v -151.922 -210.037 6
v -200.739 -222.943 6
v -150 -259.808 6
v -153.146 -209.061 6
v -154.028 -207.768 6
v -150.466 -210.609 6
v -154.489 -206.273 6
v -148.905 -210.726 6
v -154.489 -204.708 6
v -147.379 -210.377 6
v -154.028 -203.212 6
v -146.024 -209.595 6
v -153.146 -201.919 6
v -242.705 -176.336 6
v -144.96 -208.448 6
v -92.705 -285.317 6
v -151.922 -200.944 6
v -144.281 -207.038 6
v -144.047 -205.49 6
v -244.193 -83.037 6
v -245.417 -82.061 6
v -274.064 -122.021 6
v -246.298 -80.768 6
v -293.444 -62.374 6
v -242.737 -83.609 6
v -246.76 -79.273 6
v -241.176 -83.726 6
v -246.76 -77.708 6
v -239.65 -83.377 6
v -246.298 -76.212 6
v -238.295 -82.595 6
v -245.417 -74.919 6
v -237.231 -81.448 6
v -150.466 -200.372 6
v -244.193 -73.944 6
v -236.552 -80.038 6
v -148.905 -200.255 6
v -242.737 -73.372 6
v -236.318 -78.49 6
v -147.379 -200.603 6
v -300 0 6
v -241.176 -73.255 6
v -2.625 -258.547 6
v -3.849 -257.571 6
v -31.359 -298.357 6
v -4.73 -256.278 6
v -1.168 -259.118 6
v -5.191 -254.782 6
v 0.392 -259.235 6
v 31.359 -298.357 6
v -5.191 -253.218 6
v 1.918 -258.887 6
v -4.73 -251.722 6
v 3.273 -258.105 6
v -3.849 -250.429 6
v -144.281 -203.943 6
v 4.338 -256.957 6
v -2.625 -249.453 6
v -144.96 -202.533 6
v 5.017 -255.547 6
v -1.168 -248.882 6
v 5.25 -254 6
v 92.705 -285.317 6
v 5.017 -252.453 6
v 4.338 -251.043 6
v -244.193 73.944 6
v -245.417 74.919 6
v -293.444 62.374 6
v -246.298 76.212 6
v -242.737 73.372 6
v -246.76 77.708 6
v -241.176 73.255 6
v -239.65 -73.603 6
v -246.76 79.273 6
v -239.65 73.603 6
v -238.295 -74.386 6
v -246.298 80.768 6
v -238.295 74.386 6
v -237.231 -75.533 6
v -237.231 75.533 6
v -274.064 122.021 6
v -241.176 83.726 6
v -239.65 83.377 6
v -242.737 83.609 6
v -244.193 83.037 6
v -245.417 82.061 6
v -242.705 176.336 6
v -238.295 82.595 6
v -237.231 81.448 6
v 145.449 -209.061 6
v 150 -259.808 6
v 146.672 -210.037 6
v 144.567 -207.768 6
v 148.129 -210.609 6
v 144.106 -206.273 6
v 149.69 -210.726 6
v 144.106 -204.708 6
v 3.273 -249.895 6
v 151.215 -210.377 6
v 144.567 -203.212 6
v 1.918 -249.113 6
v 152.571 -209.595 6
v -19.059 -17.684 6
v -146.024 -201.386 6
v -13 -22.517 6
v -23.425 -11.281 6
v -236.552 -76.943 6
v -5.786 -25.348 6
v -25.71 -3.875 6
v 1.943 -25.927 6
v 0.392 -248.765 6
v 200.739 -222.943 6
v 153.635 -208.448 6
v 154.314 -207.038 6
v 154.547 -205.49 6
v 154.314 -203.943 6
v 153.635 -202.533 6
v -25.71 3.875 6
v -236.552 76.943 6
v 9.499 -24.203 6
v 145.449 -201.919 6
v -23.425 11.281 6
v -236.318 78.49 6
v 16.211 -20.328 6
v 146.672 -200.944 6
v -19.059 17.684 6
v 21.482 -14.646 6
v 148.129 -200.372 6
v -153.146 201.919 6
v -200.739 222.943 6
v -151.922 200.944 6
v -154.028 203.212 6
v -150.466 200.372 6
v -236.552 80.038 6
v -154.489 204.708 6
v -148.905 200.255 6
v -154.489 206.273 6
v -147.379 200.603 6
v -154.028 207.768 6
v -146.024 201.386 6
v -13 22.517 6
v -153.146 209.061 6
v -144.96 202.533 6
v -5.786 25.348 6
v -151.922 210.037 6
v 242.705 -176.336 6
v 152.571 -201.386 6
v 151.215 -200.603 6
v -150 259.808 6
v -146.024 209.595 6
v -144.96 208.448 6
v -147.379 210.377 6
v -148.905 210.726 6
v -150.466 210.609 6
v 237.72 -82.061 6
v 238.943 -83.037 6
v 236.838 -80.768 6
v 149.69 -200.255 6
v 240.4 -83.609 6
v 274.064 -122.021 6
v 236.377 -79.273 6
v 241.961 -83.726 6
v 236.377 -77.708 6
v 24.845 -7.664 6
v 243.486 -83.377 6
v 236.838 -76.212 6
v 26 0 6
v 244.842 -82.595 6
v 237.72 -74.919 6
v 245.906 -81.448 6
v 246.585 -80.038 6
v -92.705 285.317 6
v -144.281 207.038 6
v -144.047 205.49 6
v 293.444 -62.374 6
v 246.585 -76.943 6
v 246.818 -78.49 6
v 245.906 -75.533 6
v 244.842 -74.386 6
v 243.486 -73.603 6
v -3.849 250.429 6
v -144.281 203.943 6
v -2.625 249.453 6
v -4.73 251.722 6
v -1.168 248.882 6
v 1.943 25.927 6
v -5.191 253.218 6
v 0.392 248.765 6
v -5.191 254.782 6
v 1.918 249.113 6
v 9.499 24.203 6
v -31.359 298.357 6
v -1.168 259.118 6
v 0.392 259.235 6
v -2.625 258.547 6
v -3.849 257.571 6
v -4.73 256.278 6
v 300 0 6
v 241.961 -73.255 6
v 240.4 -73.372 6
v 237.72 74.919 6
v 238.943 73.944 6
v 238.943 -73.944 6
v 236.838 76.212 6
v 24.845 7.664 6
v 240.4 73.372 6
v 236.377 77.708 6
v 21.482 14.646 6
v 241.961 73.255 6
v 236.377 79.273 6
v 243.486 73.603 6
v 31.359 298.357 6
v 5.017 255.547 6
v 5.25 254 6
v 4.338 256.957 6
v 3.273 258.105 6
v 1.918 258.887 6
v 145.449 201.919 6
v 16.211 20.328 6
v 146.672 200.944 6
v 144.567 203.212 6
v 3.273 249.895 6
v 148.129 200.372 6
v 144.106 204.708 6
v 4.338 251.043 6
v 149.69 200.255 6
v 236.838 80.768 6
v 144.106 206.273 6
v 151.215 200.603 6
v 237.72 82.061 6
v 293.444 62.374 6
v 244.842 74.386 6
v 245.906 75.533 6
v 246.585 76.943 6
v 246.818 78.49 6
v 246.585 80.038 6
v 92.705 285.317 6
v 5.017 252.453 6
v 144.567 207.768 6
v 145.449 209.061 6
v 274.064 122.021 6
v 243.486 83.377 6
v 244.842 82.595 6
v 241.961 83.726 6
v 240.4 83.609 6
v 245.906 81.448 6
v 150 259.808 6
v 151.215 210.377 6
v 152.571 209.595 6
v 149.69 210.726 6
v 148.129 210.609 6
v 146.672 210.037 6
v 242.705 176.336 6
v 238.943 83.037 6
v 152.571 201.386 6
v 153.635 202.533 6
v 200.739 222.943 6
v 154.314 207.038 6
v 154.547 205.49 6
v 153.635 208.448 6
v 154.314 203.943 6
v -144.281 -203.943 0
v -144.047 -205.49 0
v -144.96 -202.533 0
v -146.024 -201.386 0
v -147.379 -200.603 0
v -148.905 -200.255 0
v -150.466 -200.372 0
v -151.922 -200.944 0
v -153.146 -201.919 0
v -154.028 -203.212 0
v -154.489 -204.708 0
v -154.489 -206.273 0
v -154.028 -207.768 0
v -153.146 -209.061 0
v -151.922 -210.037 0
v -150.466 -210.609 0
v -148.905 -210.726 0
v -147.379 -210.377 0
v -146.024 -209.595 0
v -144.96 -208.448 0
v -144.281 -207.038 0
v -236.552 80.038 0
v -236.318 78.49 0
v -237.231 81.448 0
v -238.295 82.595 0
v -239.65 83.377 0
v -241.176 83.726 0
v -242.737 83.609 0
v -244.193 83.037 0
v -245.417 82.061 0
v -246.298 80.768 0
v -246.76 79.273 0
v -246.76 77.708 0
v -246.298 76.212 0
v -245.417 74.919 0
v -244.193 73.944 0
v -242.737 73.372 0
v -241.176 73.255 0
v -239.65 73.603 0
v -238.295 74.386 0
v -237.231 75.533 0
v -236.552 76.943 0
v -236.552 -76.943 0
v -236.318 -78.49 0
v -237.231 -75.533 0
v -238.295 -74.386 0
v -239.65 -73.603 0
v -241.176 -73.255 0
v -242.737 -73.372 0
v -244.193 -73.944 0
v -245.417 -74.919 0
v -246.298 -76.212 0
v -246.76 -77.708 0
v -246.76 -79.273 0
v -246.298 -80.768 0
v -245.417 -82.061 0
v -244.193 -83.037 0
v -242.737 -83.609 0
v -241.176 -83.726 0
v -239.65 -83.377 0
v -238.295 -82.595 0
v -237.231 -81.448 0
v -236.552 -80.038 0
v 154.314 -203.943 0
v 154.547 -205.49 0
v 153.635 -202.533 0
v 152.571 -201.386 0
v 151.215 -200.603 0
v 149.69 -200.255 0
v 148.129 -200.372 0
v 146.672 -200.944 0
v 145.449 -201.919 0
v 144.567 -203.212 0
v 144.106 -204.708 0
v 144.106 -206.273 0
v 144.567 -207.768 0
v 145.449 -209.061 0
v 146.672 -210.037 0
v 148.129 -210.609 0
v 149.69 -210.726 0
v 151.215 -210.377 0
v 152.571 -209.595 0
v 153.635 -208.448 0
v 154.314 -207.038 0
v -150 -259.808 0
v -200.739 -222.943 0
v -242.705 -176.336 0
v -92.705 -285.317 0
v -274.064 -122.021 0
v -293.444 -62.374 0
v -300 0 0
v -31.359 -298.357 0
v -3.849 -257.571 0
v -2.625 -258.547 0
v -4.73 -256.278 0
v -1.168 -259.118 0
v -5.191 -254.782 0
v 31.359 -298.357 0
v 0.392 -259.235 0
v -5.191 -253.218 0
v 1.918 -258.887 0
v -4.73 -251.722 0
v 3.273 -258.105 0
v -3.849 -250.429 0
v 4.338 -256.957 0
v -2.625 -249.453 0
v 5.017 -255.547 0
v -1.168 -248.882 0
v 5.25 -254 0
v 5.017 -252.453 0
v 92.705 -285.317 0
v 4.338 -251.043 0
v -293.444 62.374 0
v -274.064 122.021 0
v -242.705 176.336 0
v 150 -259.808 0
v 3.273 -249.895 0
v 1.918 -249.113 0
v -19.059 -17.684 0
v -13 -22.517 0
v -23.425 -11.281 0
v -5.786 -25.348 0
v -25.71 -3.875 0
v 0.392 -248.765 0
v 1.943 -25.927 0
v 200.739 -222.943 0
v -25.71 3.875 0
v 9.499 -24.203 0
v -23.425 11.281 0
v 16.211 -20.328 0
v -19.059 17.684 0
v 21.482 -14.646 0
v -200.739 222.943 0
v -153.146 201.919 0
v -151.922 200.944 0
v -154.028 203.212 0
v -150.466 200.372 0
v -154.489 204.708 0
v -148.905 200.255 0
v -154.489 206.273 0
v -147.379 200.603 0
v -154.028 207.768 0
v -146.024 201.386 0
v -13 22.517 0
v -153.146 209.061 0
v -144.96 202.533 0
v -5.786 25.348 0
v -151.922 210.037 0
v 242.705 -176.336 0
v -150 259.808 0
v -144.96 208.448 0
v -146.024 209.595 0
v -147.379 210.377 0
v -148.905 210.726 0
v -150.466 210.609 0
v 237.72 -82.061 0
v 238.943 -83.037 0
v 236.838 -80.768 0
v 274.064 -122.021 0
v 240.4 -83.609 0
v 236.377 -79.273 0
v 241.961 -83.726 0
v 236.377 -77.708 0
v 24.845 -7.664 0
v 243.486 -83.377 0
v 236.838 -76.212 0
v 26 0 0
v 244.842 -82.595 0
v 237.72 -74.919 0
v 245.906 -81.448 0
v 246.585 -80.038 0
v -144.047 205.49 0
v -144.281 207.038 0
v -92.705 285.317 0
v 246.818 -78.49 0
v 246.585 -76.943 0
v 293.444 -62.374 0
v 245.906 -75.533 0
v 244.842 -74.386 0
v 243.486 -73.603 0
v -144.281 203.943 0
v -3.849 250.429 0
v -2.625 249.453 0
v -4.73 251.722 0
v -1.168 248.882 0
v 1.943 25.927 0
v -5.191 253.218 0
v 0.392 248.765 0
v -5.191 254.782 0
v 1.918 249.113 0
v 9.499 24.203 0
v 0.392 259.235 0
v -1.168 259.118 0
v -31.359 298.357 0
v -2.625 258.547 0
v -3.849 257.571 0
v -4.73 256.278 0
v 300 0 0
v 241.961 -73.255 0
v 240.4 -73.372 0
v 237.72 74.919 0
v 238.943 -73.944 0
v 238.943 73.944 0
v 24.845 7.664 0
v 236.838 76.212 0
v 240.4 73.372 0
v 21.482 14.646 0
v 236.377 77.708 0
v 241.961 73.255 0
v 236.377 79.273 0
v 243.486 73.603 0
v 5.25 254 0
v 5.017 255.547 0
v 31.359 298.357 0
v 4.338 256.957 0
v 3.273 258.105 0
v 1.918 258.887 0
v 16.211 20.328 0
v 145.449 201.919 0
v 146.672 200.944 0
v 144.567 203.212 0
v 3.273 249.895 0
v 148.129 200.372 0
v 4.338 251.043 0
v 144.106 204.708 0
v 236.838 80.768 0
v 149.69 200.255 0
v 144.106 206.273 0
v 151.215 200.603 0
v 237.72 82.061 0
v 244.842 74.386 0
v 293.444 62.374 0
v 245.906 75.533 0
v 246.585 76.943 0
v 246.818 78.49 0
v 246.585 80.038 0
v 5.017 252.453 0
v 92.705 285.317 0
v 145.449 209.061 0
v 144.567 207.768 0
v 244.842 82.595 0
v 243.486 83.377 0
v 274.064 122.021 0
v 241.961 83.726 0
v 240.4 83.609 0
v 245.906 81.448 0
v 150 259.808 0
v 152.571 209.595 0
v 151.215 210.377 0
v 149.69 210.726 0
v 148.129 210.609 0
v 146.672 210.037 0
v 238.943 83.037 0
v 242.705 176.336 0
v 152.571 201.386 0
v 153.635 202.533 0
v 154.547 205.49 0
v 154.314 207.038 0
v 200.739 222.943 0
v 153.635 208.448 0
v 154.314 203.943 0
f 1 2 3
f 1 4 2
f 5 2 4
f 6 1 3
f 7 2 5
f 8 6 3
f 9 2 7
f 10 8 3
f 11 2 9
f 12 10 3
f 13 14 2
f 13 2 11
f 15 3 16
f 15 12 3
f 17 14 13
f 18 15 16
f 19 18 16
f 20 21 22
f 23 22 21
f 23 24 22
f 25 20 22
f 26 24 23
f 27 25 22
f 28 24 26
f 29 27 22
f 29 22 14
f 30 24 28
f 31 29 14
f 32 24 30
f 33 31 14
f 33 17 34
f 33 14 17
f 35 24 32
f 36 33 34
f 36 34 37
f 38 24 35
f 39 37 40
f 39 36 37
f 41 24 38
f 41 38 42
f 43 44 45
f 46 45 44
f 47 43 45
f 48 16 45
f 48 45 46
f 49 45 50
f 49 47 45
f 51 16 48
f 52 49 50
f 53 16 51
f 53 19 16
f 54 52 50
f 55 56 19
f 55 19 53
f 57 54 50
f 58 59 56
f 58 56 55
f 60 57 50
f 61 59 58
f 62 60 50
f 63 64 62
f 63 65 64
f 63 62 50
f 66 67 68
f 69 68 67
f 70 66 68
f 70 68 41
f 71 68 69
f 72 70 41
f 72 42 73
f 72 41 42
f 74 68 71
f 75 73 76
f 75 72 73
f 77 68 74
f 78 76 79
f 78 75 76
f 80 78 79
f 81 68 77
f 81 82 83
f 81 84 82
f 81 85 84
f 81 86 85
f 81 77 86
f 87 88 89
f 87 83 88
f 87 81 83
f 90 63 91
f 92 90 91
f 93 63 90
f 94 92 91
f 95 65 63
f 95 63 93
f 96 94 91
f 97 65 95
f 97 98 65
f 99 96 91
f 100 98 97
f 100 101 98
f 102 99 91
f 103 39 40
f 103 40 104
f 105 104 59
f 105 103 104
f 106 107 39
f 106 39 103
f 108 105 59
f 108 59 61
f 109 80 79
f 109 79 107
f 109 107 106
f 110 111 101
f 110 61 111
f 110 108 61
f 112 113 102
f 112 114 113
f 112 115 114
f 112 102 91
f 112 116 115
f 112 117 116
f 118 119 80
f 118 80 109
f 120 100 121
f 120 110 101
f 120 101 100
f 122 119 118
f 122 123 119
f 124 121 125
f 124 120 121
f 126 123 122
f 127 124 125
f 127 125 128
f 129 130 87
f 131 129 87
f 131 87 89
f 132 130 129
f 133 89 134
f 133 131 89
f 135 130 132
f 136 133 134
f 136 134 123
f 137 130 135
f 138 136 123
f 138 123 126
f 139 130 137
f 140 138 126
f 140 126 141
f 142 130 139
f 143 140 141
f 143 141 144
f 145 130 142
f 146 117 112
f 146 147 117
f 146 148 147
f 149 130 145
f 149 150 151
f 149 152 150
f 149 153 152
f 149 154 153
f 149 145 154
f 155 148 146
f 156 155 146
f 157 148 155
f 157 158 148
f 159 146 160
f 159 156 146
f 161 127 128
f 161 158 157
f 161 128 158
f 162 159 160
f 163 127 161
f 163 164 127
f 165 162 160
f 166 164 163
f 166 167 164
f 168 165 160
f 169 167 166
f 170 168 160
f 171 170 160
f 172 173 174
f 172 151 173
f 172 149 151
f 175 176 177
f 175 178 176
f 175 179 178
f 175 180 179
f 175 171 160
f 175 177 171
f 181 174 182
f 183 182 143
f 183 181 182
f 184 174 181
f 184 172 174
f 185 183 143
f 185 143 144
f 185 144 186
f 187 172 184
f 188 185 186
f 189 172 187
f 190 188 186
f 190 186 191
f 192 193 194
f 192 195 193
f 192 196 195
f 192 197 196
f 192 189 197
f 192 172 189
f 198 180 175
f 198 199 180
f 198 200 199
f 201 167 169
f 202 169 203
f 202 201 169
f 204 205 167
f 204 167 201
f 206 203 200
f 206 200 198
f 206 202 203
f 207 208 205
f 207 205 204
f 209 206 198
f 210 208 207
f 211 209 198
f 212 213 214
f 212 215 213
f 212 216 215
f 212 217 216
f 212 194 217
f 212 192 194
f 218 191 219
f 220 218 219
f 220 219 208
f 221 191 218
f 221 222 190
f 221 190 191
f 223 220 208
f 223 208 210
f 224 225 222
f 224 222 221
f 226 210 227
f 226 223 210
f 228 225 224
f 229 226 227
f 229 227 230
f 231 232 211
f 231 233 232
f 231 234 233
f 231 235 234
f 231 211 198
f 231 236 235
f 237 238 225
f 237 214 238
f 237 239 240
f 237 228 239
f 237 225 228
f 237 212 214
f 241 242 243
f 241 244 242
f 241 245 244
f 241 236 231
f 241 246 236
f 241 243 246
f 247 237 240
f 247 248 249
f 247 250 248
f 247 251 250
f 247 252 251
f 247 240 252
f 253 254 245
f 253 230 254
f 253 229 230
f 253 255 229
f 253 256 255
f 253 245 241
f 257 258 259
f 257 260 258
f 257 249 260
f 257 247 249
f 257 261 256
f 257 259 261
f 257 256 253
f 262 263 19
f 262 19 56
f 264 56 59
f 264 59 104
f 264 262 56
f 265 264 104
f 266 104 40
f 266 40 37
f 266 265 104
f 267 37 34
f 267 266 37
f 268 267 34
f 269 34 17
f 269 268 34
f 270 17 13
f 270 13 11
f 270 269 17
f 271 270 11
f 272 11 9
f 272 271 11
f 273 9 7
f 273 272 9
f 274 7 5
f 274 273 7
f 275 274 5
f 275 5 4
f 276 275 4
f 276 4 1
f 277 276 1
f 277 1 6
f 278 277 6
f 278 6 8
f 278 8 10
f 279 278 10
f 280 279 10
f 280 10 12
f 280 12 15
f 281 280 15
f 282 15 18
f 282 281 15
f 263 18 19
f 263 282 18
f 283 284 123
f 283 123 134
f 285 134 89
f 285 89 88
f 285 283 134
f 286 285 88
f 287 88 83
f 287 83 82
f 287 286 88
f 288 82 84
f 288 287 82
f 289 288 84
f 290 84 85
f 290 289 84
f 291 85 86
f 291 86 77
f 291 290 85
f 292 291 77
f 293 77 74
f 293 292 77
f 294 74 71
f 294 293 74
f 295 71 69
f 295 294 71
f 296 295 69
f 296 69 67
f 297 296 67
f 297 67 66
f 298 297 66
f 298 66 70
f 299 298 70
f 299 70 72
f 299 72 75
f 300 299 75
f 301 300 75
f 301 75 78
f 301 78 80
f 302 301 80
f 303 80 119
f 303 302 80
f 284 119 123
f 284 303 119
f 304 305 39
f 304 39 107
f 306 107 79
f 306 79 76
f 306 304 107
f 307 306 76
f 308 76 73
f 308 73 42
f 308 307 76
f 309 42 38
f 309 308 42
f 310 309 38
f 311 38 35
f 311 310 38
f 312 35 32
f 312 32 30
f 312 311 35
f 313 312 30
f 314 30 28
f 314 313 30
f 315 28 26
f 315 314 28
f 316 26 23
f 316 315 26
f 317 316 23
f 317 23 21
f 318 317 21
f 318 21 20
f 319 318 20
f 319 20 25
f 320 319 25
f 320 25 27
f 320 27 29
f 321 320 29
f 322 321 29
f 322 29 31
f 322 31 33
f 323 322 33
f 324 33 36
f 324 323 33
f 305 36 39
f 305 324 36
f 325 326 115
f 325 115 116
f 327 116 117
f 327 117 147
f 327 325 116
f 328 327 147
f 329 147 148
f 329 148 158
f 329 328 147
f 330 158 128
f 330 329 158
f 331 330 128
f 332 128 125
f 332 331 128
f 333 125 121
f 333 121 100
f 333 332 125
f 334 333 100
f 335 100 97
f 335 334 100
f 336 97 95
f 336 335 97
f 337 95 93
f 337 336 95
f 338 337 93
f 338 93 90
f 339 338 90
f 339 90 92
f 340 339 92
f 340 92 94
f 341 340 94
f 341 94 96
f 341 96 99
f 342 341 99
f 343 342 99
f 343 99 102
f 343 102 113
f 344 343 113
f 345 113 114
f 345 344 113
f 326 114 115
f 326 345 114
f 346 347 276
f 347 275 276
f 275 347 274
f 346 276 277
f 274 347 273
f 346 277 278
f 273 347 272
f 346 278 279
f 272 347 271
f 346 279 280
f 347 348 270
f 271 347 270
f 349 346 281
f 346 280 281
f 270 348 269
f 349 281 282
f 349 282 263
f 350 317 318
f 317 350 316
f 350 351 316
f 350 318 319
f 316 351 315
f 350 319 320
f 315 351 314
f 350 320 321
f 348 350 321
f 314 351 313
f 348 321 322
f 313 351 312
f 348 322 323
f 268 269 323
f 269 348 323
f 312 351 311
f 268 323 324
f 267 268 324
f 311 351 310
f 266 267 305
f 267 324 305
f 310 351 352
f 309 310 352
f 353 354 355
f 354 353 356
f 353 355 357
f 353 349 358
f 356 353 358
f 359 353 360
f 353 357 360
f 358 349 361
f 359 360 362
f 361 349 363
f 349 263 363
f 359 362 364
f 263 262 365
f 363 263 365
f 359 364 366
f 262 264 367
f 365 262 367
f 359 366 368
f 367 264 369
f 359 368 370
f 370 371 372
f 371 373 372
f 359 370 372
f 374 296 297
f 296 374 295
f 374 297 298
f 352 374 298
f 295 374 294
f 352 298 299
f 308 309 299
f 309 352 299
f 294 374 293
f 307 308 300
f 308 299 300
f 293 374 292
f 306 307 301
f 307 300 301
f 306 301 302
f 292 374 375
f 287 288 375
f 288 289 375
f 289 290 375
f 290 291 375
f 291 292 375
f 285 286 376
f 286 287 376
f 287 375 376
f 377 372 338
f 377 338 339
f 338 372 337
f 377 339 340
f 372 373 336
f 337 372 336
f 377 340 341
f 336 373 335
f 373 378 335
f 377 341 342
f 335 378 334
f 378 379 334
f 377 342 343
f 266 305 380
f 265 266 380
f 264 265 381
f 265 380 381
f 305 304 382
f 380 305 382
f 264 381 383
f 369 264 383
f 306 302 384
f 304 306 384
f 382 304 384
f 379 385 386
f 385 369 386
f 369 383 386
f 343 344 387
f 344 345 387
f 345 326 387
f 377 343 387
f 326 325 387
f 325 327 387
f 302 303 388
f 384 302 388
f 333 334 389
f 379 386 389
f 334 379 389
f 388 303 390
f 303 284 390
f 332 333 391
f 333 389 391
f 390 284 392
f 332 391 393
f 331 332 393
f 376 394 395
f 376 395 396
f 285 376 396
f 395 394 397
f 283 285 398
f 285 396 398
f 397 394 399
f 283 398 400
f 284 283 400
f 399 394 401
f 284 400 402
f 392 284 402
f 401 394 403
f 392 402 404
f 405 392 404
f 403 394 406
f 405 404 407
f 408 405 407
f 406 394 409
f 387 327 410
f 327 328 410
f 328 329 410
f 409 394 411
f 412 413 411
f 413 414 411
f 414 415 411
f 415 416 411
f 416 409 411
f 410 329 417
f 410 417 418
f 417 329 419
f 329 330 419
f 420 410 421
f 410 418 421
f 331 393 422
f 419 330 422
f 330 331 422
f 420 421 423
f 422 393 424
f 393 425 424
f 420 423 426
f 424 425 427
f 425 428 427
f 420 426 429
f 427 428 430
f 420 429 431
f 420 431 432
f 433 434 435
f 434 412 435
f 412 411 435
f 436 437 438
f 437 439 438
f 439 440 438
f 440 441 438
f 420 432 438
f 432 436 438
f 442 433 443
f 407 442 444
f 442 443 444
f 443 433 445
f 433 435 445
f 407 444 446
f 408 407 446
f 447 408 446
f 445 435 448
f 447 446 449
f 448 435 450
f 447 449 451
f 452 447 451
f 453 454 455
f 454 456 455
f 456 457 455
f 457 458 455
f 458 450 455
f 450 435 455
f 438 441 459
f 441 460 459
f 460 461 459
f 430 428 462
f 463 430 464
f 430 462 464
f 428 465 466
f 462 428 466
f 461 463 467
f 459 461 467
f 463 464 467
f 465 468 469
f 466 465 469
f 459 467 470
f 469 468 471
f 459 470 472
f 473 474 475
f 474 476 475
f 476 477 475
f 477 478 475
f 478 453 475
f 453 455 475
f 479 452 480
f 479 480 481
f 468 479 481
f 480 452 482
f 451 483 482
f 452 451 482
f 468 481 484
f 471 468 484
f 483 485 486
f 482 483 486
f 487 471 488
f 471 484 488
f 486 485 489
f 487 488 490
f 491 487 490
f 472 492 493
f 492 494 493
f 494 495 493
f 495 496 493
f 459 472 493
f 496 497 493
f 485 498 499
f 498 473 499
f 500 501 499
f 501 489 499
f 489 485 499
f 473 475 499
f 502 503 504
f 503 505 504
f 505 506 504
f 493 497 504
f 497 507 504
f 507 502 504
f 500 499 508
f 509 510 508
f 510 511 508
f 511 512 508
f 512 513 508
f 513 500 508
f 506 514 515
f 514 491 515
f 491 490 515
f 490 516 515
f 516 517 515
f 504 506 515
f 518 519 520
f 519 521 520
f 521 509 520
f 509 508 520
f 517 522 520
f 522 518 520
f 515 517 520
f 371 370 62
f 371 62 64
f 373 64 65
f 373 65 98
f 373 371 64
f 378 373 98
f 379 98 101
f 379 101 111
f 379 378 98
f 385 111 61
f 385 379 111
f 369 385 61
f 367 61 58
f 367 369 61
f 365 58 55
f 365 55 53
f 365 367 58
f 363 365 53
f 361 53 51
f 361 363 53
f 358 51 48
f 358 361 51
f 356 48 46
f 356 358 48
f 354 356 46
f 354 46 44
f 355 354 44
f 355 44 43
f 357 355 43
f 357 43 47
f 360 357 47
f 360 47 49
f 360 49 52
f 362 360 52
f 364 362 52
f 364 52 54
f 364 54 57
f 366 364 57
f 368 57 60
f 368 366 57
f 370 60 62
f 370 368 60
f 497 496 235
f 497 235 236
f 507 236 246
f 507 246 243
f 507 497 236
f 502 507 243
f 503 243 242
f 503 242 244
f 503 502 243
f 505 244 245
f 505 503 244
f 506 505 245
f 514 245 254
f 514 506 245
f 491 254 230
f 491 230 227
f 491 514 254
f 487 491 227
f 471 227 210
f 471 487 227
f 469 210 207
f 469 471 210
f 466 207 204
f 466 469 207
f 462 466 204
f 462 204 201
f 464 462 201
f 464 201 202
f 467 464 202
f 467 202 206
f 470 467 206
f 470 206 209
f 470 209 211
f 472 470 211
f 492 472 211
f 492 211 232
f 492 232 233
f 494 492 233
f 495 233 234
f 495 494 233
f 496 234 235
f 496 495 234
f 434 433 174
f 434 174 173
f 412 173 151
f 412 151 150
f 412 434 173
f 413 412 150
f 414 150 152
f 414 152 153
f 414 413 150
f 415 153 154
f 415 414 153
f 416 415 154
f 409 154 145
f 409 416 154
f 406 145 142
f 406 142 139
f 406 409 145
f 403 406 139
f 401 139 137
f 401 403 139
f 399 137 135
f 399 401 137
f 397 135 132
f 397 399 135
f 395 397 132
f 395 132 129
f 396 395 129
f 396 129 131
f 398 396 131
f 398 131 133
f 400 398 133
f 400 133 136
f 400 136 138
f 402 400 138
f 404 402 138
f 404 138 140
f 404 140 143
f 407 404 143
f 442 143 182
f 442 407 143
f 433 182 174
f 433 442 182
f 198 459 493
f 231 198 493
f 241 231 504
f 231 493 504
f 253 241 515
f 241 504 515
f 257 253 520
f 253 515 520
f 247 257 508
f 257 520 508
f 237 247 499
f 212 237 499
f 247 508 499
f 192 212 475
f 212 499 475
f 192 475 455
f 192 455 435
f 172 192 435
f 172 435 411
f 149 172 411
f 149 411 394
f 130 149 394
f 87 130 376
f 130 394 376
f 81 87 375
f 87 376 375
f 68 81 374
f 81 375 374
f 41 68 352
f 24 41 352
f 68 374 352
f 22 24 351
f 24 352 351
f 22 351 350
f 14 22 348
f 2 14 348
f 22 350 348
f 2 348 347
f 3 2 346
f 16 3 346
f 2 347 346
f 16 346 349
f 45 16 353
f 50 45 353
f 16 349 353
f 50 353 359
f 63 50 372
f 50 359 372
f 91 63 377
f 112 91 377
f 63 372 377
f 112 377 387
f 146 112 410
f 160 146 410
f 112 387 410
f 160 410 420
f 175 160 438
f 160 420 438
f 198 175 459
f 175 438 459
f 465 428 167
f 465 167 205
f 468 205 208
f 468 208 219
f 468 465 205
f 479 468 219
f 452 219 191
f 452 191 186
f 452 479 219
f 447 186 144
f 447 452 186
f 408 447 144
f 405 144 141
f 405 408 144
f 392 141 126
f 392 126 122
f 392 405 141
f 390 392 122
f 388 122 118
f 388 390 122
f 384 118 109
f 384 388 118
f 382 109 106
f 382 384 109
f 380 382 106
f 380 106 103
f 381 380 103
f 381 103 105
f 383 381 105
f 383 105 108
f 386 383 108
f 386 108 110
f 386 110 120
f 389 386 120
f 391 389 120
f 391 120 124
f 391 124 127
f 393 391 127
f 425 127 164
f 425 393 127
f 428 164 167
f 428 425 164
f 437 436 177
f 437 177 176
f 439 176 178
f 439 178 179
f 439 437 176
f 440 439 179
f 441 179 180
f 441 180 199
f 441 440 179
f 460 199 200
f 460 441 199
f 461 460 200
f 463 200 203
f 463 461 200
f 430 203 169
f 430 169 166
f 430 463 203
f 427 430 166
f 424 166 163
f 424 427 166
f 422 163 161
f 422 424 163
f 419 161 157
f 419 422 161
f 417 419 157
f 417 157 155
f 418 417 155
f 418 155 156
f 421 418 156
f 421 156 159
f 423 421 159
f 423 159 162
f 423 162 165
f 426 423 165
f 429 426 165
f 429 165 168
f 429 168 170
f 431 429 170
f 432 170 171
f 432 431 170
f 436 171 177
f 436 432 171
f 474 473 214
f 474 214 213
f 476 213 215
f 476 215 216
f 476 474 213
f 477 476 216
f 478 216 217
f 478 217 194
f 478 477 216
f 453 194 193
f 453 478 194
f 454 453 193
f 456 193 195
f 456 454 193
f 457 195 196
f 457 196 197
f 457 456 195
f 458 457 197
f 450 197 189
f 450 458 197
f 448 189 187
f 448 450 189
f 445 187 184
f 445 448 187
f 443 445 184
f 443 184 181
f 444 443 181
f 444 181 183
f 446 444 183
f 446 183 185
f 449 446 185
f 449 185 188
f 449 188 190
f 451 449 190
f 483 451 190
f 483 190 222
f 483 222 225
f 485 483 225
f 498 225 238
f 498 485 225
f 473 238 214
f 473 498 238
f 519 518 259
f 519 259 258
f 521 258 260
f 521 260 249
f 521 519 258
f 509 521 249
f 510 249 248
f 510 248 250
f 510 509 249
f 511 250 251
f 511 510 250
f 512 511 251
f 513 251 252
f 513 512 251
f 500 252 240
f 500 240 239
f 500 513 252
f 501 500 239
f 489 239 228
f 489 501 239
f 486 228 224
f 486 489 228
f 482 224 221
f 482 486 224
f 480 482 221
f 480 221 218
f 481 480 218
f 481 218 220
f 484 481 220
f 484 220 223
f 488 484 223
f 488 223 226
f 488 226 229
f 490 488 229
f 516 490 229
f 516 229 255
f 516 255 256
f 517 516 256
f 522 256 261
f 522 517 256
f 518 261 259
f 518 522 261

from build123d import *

# Parameters (mm, degrees)
F0_R     = 300
F0_R_2   = 5.25
F0_R_3   = 26
F1_DEPTH = 6


with BuildPart() as f1:
    # F0 (on Top) → F1 (new body)
    with BuildSketch(Plane.XY):
        Circle(F0_R)
        with Locations((-149.297454, -205.490317)):
            Circle(F0_R_2, mode=Mode.SUBTRACT)
        with Locations((-241.568355, -78.490317)):
            Circle(F0_R_2, mode=Mode.SUBTRACT)
        with Locations((0, -254)):
            Circle(F0_R_2, mode=Mode.SUBTRACT)
        with Locations((149.297454, -205.490317)):
            Circle(F0_R_2, mode=Mode.SUBTRACT)
        with Locations((241.568355, -78.490317)):
            Circle(F0_R_2, mode=Mode.SUBTRACT)
        with Locations((-241.568355, 78.490317)):
            Circle(F0_R_2, mode=Mode.SUBTRACT)
        with Locations((-149.297454, 205.490317)):
            Circle(F0_R_2, mode=Mode.SUBTRACT)
        Circle(F0_R_3, mode=Mode.SUBTRACT)
        with Locations((241.568355, 78.490317)):
            Circle(F0_R_2, mode=Mode.SUBTRACT)
        with Locations((149.297454, 205.490317)):
            Circle(F0_R_2, mode=Mode.SUBTRACT)
        with Locations((0, 254)):
            Circle(F0_R_2, mode=Mode.SUBTRACT)
    extrude(amount=F1_DEPTH)


solid = f1.part
